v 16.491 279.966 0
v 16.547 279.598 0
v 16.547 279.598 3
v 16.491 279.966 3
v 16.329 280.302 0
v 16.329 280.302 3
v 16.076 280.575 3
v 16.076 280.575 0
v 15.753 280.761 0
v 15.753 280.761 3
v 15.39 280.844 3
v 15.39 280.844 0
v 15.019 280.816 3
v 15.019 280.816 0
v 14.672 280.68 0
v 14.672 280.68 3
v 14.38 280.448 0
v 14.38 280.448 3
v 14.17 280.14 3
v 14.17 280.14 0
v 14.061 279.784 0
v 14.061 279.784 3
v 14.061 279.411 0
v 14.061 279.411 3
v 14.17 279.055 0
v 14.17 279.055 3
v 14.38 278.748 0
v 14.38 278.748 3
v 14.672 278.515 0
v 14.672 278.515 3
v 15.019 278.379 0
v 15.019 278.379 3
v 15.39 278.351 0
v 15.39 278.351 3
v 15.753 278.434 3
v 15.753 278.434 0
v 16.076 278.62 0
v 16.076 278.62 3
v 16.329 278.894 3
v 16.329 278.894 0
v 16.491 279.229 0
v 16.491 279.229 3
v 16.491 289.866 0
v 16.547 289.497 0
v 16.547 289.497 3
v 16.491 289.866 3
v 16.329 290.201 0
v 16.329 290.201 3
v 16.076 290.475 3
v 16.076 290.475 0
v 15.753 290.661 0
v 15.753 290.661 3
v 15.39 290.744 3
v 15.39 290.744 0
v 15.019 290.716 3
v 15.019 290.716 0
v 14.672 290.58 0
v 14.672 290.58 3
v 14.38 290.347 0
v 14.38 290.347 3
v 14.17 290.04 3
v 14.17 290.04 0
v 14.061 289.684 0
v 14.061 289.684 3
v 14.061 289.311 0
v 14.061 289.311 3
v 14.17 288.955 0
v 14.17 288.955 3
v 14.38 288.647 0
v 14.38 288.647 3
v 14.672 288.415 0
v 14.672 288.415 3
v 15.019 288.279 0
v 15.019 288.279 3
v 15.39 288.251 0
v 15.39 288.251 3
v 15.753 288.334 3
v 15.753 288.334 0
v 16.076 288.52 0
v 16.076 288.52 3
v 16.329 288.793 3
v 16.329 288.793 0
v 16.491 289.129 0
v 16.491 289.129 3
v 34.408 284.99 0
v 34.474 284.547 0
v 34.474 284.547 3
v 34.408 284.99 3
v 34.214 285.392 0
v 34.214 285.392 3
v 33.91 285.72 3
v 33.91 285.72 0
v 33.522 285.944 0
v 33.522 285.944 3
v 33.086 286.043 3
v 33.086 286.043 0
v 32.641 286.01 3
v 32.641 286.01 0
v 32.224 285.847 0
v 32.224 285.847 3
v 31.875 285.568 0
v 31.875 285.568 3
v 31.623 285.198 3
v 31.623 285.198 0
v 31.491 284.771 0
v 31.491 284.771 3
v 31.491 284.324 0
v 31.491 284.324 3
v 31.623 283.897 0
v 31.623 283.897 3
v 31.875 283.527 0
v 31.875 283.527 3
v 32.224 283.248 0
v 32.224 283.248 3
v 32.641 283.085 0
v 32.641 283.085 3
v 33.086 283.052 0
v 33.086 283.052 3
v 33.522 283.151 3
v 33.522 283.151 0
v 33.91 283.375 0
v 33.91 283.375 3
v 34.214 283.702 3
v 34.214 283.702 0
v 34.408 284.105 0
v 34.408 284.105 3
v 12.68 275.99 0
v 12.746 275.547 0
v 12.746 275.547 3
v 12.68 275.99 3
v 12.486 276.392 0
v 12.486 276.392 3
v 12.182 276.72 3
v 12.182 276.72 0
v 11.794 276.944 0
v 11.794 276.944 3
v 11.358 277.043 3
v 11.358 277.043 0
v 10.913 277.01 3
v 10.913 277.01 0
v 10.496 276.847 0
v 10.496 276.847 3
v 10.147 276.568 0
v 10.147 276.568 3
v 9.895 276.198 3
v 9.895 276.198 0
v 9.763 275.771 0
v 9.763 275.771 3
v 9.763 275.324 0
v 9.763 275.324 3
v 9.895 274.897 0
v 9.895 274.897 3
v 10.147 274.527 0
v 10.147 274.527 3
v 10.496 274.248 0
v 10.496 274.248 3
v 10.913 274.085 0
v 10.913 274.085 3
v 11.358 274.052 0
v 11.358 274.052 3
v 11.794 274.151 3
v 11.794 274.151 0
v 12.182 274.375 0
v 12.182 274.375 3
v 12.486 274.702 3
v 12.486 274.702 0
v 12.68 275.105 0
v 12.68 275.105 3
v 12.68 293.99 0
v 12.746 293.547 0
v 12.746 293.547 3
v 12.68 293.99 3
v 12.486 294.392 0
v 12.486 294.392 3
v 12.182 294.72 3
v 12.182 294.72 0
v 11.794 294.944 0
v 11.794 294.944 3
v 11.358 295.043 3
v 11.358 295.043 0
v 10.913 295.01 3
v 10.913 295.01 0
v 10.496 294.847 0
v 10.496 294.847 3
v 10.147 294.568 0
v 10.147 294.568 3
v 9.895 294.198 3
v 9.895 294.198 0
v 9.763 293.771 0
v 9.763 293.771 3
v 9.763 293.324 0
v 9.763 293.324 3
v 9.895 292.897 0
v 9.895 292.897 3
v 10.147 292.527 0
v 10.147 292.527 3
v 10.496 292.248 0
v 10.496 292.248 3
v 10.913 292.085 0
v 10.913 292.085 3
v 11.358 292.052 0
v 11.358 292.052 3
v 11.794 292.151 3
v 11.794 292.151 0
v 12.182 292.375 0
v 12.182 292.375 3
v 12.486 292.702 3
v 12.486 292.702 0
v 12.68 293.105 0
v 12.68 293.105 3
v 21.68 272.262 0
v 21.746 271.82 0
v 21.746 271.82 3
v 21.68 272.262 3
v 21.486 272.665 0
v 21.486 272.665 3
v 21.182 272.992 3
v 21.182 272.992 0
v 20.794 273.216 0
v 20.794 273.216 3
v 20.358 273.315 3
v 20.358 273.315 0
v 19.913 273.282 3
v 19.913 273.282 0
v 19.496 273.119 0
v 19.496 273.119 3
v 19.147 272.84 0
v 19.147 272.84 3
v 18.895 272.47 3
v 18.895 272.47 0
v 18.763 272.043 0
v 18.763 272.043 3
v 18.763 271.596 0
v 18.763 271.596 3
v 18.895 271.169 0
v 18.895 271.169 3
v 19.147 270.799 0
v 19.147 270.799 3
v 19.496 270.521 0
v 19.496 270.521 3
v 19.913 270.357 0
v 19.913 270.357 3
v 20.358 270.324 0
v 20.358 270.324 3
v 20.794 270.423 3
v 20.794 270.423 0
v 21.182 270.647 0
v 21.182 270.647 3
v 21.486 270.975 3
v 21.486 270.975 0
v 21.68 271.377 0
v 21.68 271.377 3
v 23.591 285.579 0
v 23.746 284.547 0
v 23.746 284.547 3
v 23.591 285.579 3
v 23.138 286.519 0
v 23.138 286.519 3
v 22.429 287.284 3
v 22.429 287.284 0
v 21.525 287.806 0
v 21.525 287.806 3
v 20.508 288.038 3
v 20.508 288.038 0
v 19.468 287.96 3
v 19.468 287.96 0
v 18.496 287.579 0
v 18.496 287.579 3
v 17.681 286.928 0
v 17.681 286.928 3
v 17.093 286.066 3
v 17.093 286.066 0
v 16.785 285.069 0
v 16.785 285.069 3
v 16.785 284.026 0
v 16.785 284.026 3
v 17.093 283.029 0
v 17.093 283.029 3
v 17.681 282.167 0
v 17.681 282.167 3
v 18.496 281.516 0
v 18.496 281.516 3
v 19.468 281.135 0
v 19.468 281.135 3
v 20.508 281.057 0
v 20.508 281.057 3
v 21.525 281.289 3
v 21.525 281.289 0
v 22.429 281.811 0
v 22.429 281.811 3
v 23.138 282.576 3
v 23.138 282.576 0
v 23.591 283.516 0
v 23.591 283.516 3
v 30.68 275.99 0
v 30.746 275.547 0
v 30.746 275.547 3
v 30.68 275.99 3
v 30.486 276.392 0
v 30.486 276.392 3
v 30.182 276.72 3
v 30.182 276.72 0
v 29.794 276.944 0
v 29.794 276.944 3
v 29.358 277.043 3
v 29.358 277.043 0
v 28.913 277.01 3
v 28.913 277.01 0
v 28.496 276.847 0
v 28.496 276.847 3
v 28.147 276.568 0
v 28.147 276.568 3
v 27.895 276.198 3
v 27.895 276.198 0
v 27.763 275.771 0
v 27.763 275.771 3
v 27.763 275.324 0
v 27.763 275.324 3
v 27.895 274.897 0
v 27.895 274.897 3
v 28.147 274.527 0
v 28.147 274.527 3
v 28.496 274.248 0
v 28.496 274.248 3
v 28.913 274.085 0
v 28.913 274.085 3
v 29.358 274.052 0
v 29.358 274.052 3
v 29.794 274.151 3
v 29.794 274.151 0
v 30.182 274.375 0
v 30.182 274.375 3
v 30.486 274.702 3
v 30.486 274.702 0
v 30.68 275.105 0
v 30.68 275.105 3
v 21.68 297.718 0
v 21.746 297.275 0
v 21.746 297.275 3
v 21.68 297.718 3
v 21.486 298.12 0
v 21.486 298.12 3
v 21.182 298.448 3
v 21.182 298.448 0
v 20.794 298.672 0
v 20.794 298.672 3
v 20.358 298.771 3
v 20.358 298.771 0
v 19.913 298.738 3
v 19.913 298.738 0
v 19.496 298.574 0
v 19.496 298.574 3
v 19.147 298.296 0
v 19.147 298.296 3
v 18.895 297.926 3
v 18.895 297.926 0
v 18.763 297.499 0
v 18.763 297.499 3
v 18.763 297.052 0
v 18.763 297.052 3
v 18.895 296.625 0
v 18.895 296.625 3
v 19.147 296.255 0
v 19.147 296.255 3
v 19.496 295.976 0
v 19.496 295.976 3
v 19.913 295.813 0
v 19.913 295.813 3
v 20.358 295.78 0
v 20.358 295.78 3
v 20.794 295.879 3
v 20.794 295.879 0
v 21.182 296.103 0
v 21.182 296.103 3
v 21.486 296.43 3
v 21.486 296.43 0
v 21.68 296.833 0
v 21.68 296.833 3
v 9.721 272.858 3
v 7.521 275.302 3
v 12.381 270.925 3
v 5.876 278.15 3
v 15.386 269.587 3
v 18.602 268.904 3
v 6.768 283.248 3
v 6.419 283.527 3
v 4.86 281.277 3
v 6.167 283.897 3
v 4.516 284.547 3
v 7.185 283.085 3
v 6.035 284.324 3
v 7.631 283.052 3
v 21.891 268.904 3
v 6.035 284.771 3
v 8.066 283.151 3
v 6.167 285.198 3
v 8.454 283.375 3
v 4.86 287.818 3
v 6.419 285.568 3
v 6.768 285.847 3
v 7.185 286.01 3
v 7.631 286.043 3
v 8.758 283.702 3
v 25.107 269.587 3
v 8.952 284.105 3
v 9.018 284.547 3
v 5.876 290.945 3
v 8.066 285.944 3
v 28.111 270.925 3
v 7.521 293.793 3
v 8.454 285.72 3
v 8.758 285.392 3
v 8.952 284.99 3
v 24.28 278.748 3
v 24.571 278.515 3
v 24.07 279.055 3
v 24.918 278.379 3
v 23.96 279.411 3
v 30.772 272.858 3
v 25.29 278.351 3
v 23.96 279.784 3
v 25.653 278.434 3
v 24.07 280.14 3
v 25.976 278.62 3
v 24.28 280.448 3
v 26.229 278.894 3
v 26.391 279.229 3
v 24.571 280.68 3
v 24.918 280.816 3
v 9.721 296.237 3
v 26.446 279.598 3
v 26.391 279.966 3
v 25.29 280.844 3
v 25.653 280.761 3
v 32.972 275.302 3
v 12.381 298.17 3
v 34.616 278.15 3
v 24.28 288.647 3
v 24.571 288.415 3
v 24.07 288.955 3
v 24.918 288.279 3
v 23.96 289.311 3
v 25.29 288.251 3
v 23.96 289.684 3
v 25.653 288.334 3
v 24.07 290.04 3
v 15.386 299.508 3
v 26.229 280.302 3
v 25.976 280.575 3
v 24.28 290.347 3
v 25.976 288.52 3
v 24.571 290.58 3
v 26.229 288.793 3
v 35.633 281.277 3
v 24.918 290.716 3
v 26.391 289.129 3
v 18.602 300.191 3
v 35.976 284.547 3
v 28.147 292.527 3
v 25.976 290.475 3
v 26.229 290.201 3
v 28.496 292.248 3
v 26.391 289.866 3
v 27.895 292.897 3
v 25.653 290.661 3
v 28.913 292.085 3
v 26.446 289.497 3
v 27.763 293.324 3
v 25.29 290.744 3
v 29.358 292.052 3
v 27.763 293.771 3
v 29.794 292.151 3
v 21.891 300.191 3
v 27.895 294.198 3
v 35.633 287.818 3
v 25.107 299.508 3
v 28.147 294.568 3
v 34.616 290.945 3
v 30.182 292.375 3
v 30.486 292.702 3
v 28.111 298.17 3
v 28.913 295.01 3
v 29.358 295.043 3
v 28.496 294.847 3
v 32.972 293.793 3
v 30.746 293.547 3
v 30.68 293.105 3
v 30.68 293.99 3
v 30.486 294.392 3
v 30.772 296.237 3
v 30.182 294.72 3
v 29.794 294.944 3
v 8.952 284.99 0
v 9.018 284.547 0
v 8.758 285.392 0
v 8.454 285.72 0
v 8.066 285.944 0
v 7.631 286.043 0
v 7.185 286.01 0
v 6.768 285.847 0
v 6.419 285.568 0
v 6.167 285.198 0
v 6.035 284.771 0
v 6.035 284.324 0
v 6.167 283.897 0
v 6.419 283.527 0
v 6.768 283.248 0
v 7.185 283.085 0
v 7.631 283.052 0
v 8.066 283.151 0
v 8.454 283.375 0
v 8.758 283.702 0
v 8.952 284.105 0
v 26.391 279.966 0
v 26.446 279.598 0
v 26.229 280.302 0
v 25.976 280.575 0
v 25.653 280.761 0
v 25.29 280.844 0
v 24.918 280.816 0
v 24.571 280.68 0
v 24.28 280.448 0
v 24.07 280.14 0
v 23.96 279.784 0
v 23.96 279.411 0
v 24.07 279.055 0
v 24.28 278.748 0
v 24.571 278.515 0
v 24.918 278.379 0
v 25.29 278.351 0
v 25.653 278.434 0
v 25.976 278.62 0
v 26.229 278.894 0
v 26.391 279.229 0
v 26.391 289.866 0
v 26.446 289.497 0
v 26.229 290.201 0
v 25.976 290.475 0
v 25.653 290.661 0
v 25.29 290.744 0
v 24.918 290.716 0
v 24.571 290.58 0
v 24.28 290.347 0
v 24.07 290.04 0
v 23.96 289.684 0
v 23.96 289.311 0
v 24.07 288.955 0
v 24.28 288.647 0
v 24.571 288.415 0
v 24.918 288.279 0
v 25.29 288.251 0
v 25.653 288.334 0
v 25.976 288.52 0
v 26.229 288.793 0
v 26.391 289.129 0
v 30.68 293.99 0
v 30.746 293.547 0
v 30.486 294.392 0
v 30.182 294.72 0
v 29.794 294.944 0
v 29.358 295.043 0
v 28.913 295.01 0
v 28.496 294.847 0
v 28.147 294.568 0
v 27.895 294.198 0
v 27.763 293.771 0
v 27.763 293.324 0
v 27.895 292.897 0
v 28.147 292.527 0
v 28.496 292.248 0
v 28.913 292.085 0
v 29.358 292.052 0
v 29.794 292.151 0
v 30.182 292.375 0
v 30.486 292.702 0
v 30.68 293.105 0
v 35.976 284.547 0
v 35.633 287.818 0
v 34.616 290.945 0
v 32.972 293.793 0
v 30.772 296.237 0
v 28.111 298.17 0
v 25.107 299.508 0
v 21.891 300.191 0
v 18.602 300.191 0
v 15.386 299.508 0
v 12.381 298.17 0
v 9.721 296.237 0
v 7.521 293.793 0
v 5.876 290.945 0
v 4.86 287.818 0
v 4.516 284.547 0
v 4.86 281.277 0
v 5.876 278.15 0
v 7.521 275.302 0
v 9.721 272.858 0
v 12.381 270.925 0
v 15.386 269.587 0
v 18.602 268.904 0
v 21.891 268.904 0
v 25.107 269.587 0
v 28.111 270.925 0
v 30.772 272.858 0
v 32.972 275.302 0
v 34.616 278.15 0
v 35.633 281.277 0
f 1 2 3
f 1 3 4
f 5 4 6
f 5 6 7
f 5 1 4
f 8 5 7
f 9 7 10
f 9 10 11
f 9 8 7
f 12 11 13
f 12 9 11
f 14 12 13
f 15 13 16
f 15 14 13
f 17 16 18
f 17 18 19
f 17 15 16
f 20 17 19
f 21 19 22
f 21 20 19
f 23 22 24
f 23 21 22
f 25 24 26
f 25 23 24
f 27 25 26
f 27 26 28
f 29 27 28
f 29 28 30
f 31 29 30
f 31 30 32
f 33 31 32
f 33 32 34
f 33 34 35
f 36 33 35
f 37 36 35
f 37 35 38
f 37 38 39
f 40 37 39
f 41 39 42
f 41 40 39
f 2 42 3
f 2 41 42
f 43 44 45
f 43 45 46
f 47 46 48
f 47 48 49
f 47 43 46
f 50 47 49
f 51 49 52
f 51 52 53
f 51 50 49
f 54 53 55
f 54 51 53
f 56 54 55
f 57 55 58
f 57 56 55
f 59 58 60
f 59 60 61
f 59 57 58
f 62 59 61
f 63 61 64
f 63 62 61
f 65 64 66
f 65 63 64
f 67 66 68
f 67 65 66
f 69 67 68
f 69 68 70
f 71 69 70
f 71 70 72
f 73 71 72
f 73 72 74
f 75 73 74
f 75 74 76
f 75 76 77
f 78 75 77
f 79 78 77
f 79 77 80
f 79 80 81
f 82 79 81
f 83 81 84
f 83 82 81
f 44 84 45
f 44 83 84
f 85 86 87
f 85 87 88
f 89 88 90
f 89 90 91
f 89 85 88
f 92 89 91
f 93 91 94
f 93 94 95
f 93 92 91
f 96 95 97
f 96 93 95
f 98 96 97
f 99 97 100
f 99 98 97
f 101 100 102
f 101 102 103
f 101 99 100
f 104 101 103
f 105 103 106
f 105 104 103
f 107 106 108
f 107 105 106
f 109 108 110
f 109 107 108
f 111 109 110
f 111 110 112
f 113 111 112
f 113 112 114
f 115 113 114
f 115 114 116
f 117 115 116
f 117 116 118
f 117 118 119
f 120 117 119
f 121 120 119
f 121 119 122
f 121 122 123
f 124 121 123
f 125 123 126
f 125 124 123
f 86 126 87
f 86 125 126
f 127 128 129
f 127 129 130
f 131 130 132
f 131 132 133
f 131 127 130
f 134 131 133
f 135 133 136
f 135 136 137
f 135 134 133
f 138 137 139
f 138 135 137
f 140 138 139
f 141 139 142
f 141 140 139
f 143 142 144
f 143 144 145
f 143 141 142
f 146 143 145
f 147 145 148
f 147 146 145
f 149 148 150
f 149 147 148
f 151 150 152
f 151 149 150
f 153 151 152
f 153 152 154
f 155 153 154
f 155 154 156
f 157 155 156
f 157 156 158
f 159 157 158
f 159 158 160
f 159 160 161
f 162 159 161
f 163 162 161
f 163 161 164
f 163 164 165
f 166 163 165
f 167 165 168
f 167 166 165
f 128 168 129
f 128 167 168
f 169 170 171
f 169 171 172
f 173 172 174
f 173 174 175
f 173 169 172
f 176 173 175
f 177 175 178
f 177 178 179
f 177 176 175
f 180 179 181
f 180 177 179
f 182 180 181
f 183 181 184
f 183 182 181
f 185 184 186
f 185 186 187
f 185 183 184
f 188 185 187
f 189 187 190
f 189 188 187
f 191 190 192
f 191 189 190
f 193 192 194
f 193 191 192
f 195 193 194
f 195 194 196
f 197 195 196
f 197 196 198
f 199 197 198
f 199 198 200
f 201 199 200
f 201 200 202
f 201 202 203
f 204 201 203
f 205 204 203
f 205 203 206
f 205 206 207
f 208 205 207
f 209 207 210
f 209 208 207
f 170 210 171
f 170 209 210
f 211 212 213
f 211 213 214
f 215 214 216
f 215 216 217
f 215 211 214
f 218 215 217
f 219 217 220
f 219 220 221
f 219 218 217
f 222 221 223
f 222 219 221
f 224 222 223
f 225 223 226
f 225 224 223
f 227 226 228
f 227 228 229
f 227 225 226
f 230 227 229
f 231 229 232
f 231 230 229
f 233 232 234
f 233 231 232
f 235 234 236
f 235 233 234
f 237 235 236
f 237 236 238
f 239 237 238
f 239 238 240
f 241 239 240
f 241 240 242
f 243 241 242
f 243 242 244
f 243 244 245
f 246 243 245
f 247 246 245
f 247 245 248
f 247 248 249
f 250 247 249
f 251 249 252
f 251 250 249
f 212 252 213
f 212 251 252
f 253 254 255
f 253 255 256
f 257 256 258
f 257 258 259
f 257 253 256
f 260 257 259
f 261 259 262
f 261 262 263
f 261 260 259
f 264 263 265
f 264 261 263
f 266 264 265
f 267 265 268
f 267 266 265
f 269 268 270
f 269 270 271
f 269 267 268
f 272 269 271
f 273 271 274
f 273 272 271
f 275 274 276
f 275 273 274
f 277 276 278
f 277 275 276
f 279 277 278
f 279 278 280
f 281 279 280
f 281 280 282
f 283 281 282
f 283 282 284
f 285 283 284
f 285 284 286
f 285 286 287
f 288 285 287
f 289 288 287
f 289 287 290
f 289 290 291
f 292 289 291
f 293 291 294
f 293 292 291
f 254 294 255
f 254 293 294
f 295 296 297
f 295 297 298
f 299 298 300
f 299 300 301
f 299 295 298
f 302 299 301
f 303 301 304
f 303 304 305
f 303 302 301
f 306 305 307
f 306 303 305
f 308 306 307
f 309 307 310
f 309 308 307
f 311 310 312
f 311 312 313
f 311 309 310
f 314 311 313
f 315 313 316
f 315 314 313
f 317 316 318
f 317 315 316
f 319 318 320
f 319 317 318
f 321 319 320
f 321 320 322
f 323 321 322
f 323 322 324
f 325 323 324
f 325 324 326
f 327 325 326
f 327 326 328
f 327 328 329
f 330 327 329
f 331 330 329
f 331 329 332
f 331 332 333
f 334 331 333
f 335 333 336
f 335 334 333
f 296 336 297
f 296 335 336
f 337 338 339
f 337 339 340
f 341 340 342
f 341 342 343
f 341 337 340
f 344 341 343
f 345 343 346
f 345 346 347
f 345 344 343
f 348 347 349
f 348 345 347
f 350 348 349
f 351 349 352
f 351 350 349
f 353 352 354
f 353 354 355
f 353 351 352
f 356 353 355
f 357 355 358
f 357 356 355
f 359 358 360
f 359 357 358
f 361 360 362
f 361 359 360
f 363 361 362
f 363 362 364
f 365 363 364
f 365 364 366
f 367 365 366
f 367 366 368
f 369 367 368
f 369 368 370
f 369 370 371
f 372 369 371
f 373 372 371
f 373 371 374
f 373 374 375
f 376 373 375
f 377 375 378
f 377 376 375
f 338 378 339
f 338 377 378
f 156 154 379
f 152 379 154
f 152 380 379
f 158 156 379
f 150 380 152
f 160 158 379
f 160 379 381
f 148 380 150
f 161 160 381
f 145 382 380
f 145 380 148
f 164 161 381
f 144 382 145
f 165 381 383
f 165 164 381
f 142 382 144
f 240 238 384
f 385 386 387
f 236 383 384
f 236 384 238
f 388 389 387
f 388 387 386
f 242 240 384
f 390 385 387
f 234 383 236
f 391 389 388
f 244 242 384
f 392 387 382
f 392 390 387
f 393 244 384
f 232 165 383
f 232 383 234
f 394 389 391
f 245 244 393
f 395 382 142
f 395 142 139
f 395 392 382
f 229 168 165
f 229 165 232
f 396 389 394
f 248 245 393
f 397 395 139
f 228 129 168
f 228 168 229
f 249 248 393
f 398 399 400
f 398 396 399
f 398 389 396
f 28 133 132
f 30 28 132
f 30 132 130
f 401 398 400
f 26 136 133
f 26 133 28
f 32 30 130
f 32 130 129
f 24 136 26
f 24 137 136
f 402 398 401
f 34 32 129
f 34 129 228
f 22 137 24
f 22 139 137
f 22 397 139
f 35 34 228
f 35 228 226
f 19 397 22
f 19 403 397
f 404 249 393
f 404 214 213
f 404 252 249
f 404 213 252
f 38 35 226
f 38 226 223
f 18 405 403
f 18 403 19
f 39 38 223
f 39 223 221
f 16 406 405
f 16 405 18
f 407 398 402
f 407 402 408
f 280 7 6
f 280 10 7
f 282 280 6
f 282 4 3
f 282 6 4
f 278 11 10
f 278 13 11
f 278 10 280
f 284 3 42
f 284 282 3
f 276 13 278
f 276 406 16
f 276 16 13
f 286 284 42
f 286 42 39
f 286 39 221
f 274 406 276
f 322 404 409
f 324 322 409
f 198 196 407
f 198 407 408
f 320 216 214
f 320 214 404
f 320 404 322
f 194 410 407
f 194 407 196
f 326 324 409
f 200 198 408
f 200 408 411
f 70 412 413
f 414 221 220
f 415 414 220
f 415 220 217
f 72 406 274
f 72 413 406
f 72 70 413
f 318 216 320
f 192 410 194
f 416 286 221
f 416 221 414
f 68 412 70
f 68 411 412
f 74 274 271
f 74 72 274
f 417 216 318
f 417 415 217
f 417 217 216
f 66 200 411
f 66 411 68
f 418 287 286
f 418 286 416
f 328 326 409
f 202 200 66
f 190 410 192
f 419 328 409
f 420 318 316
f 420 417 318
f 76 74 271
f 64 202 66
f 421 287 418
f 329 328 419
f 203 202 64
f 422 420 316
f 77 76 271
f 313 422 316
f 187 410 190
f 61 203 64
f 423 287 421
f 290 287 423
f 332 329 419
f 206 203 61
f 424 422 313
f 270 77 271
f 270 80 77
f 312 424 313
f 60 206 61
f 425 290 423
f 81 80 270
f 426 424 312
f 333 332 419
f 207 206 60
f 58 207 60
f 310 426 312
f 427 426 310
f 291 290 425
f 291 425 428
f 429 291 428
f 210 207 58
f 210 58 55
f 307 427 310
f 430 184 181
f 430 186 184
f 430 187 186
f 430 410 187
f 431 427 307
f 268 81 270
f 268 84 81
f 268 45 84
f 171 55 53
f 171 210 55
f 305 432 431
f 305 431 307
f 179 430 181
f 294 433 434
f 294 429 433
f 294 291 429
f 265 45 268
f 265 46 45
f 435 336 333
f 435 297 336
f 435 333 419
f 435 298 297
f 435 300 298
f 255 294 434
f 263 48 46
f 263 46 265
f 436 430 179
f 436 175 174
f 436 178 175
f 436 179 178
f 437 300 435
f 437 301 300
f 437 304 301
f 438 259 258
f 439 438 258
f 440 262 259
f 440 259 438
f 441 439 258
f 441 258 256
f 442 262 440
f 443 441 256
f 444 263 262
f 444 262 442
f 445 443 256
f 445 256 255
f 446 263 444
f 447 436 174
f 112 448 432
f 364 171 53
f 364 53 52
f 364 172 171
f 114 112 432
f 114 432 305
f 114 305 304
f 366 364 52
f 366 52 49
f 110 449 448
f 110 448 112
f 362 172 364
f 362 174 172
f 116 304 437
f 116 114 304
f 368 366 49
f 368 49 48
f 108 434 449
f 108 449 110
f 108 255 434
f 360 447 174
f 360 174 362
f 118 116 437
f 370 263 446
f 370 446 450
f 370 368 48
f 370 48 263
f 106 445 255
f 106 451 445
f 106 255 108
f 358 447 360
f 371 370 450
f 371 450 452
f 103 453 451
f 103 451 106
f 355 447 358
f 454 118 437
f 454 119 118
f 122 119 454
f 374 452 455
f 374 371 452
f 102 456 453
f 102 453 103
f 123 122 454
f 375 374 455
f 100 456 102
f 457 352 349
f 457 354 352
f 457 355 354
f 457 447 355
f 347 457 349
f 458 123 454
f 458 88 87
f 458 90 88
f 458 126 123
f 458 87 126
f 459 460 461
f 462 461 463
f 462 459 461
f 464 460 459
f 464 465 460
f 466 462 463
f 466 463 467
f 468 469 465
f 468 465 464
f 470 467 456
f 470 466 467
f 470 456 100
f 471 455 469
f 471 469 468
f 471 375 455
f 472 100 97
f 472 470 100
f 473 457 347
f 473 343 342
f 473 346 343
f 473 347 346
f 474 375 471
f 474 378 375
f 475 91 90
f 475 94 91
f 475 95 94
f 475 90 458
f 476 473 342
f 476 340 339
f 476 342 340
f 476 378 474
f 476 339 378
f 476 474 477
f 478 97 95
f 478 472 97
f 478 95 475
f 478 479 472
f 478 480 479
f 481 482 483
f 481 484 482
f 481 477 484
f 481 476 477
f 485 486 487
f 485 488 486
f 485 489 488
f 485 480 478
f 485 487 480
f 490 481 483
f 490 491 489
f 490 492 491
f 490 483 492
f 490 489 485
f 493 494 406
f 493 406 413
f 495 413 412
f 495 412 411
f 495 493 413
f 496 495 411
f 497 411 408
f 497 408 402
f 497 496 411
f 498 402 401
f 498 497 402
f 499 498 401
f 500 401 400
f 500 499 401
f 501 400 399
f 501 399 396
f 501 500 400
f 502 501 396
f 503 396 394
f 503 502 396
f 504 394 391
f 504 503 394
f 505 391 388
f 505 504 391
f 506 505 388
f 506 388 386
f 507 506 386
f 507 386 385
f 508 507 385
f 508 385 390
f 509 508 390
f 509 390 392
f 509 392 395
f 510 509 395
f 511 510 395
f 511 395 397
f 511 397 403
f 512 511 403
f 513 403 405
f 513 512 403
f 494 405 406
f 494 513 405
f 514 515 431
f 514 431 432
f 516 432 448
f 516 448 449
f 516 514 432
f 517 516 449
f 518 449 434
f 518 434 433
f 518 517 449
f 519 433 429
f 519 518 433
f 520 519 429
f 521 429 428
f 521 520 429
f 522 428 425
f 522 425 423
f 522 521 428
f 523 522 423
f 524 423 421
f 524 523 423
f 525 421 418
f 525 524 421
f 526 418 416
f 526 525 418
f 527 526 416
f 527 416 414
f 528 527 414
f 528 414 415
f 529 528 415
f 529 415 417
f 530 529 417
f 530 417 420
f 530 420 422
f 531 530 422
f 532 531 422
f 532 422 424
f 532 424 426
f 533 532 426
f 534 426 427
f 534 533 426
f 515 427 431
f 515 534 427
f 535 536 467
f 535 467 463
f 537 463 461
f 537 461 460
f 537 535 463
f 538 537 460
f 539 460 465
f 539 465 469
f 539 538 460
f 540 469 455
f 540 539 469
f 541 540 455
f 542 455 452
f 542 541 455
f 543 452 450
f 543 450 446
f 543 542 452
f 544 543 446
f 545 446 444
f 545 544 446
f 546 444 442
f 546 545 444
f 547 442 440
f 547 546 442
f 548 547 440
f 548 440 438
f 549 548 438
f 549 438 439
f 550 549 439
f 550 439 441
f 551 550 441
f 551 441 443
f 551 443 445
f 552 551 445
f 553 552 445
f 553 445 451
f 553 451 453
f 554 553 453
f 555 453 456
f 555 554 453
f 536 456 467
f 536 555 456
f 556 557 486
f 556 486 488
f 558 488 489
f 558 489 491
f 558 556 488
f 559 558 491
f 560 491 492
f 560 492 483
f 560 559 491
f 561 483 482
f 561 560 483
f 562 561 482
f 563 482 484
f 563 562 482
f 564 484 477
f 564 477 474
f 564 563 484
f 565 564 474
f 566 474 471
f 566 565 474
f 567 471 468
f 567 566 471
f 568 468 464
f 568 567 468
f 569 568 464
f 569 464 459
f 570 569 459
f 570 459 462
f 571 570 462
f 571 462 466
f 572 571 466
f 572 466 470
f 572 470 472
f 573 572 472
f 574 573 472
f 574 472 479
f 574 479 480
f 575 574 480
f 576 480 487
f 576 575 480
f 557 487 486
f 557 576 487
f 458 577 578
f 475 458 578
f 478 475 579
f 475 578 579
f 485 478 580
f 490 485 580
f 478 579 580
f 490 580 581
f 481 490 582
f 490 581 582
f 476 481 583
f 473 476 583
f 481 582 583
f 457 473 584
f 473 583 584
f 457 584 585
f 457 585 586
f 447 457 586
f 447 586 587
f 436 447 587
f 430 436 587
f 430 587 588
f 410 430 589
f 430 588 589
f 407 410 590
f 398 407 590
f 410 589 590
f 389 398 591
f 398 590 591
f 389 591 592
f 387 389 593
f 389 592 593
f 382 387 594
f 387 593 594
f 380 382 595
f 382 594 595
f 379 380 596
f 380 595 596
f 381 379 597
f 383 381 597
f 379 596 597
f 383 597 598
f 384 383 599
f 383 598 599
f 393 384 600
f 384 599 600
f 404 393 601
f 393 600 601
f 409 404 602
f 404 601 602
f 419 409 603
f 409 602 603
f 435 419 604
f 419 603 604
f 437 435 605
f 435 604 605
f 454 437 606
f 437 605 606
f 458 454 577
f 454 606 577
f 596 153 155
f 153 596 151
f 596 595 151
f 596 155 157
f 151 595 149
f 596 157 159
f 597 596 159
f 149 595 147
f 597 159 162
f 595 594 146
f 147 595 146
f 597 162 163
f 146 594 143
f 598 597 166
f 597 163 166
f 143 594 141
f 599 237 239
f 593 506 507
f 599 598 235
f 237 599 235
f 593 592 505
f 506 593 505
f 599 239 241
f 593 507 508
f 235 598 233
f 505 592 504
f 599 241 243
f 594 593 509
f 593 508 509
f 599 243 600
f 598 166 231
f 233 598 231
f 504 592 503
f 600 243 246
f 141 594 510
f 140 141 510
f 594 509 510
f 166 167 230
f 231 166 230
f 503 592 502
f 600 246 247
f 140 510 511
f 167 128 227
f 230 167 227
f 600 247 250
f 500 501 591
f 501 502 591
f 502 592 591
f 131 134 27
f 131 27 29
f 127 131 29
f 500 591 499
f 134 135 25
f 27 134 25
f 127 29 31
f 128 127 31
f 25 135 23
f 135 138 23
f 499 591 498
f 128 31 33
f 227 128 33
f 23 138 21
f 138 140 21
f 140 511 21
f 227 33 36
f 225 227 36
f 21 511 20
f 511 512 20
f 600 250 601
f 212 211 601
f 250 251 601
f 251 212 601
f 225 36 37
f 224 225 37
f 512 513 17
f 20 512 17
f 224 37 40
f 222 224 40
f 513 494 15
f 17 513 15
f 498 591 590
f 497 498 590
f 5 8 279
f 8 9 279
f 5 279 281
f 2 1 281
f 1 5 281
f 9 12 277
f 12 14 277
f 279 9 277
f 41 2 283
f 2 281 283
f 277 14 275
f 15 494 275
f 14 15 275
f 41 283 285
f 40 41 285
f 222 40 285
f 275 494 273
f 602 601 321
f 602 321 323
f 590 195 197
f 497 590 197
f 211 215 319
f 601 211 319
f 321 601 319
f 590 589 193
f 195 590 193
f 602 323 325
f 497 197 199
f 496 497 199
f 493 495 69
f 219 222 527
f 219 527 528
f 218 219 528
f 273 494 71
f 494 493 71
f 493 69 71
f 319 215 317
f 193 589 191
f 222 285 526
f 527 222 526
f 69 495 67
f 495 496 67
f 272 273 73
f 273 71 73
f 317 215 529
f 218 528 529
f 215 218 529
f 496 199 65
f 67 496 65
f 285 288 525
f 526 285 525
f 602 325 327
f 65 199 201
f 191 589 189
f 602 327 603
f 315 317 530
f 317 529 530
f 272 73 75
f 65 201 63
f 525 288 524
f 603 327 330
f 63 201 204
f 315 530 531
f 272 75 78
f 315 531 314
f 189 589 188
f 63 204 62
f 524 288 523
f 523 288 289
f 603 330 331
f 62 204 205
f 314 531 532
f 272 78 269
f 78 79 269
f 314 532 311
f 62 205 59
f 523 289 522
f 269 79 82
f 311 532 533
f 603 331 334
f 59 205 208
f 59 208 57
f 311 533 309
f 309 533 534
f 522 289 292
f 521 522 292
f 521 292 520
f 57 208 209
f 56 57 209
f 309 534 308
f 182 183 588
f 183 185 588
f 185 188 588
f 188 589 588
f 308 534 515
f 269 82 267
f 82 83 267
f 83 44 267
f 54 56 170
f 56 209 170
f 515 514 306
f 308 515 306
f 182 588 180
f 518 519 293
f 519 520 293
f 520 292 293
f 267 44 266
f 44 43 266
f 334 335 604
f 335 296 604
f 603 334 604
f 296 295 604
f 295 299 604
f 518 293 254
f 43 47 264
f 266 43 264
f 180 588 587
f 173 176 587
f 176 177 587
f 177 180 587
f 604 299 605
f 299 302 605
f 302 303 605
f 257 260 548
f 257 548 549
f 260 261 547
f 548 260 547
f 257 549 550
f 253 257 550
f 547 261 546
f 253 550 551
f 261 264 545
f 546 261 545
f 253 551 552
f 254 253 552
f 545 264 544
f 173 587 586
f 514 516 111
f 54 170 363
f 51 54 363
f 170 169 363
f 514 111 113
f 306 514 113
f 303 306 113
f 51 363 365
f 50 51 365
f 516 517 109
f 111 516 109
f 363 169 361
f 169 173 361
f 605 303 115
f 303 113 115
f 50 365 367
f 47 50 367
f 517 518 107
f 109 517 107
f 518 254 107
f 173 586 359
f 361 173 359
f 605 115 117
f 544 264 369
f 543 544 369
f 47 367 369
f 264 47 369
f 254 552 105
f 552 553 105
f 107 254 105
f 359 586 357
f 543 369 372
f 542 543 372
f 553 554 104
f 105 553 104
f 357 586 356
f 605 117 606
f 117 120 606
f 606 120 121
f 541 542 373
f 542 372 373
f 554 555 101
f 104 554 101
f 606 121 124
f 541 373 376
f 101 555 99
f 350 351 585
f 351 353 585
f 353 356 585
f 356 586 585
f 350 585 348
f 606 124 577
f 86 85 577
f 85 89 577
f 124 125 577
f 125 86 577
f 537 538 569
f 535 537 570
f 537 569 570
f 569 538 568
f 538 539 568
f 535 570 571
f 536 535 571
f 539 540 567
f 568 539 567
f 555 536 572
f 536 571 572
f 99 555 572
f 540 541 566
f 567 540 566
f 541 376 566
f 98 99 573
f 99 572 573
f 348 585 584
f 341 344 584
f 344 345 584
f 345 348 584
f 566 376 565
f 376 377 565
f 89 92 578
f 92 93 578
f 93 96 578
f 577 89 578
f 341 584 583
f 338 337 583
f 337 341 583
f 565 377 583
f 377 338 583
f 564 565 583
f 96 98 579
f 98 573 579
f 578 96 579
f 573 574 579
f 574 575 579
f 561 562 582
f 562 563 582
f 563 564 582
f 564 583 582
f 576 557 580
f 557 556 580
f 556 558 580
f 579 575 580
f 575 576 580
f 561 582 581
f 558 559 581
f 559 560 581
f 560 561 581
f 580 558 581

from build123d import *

# Parameters (mm, degrees)
MODEL_R                 = 15.73
MODEL_R_2               = 1.5
MODEL_R_3               = 1.25
MODEL_R_4               = 3.5
SALIENTE_EXTRUIR1_DEPTH = 3


with BuildPart() as part:
    # Model → Saliente-Extruir1 (new body)
    with BuildSketch(Plane.XY):
        with Locations((20.246400491, 284.547476206)):
            Circle(MODEL_R)
        with Locations((20.246400491, 297.275398267)):
            Circle(MODEL_R_2, mode=Mode.SUBTRACT)
        with Locations((7.51847843, 284.547476206)):
            Circle(MODEL_R_2, mode=Mode.SUBTRACT)
        with Locations((20.246400491, 271.819554144)):
            Circle(MODEL_R_2, mode=Mode.SUBTRACT)
        with Locations((32.974322552, 284.547476206)):
            Circle(MODEL_R_2, mode=Mode.SUBTRACT)
        with Locations((15.296653023, 289.497223674)):
            Circle(MODEL_R_3, mode=Mode.SUBTRACT)
        with Locations((15.296653023, 279.597728738)):
            Circle(MODEL_R_3, mode=Mode.SUBTRACT)
        with Locations((25.196147959, 279.597728738)):
            Circle(MODEL_R_3, mode=Mode.SUBTRACT)
        with Locations((25.196147959, 289.497223674)):
            Circle(MODEL_R_3, mode=Mode.SUBTRACT)
        with Locations((20.246400491, 284.547476206)):
            Circle(MODEL_R_4, mode=Mode.SUBTRACT)
        with Locations((11.246400491, 293.547476206)):
            Circle(MODEL_R_2, mode=Mode.SUBTRACT)
        with Locations((11.246400491, 275.547476206)):
            Circle(MODEL_R_2, mode=Mode.SUBTRACT)
        with Locations((29.246400491, 275.547476206)):
            Circle(MODEL_R_2, mode=Mode.SUBTRACT)
        with Locations((29.246400491, 293.547476206)):
            Circle(MODEL_R_2, mode=Mode.SUBTRACT)
    extrude(amount=SALIENTE_EXTRUIR1_DEPTH)


solid = part.part
